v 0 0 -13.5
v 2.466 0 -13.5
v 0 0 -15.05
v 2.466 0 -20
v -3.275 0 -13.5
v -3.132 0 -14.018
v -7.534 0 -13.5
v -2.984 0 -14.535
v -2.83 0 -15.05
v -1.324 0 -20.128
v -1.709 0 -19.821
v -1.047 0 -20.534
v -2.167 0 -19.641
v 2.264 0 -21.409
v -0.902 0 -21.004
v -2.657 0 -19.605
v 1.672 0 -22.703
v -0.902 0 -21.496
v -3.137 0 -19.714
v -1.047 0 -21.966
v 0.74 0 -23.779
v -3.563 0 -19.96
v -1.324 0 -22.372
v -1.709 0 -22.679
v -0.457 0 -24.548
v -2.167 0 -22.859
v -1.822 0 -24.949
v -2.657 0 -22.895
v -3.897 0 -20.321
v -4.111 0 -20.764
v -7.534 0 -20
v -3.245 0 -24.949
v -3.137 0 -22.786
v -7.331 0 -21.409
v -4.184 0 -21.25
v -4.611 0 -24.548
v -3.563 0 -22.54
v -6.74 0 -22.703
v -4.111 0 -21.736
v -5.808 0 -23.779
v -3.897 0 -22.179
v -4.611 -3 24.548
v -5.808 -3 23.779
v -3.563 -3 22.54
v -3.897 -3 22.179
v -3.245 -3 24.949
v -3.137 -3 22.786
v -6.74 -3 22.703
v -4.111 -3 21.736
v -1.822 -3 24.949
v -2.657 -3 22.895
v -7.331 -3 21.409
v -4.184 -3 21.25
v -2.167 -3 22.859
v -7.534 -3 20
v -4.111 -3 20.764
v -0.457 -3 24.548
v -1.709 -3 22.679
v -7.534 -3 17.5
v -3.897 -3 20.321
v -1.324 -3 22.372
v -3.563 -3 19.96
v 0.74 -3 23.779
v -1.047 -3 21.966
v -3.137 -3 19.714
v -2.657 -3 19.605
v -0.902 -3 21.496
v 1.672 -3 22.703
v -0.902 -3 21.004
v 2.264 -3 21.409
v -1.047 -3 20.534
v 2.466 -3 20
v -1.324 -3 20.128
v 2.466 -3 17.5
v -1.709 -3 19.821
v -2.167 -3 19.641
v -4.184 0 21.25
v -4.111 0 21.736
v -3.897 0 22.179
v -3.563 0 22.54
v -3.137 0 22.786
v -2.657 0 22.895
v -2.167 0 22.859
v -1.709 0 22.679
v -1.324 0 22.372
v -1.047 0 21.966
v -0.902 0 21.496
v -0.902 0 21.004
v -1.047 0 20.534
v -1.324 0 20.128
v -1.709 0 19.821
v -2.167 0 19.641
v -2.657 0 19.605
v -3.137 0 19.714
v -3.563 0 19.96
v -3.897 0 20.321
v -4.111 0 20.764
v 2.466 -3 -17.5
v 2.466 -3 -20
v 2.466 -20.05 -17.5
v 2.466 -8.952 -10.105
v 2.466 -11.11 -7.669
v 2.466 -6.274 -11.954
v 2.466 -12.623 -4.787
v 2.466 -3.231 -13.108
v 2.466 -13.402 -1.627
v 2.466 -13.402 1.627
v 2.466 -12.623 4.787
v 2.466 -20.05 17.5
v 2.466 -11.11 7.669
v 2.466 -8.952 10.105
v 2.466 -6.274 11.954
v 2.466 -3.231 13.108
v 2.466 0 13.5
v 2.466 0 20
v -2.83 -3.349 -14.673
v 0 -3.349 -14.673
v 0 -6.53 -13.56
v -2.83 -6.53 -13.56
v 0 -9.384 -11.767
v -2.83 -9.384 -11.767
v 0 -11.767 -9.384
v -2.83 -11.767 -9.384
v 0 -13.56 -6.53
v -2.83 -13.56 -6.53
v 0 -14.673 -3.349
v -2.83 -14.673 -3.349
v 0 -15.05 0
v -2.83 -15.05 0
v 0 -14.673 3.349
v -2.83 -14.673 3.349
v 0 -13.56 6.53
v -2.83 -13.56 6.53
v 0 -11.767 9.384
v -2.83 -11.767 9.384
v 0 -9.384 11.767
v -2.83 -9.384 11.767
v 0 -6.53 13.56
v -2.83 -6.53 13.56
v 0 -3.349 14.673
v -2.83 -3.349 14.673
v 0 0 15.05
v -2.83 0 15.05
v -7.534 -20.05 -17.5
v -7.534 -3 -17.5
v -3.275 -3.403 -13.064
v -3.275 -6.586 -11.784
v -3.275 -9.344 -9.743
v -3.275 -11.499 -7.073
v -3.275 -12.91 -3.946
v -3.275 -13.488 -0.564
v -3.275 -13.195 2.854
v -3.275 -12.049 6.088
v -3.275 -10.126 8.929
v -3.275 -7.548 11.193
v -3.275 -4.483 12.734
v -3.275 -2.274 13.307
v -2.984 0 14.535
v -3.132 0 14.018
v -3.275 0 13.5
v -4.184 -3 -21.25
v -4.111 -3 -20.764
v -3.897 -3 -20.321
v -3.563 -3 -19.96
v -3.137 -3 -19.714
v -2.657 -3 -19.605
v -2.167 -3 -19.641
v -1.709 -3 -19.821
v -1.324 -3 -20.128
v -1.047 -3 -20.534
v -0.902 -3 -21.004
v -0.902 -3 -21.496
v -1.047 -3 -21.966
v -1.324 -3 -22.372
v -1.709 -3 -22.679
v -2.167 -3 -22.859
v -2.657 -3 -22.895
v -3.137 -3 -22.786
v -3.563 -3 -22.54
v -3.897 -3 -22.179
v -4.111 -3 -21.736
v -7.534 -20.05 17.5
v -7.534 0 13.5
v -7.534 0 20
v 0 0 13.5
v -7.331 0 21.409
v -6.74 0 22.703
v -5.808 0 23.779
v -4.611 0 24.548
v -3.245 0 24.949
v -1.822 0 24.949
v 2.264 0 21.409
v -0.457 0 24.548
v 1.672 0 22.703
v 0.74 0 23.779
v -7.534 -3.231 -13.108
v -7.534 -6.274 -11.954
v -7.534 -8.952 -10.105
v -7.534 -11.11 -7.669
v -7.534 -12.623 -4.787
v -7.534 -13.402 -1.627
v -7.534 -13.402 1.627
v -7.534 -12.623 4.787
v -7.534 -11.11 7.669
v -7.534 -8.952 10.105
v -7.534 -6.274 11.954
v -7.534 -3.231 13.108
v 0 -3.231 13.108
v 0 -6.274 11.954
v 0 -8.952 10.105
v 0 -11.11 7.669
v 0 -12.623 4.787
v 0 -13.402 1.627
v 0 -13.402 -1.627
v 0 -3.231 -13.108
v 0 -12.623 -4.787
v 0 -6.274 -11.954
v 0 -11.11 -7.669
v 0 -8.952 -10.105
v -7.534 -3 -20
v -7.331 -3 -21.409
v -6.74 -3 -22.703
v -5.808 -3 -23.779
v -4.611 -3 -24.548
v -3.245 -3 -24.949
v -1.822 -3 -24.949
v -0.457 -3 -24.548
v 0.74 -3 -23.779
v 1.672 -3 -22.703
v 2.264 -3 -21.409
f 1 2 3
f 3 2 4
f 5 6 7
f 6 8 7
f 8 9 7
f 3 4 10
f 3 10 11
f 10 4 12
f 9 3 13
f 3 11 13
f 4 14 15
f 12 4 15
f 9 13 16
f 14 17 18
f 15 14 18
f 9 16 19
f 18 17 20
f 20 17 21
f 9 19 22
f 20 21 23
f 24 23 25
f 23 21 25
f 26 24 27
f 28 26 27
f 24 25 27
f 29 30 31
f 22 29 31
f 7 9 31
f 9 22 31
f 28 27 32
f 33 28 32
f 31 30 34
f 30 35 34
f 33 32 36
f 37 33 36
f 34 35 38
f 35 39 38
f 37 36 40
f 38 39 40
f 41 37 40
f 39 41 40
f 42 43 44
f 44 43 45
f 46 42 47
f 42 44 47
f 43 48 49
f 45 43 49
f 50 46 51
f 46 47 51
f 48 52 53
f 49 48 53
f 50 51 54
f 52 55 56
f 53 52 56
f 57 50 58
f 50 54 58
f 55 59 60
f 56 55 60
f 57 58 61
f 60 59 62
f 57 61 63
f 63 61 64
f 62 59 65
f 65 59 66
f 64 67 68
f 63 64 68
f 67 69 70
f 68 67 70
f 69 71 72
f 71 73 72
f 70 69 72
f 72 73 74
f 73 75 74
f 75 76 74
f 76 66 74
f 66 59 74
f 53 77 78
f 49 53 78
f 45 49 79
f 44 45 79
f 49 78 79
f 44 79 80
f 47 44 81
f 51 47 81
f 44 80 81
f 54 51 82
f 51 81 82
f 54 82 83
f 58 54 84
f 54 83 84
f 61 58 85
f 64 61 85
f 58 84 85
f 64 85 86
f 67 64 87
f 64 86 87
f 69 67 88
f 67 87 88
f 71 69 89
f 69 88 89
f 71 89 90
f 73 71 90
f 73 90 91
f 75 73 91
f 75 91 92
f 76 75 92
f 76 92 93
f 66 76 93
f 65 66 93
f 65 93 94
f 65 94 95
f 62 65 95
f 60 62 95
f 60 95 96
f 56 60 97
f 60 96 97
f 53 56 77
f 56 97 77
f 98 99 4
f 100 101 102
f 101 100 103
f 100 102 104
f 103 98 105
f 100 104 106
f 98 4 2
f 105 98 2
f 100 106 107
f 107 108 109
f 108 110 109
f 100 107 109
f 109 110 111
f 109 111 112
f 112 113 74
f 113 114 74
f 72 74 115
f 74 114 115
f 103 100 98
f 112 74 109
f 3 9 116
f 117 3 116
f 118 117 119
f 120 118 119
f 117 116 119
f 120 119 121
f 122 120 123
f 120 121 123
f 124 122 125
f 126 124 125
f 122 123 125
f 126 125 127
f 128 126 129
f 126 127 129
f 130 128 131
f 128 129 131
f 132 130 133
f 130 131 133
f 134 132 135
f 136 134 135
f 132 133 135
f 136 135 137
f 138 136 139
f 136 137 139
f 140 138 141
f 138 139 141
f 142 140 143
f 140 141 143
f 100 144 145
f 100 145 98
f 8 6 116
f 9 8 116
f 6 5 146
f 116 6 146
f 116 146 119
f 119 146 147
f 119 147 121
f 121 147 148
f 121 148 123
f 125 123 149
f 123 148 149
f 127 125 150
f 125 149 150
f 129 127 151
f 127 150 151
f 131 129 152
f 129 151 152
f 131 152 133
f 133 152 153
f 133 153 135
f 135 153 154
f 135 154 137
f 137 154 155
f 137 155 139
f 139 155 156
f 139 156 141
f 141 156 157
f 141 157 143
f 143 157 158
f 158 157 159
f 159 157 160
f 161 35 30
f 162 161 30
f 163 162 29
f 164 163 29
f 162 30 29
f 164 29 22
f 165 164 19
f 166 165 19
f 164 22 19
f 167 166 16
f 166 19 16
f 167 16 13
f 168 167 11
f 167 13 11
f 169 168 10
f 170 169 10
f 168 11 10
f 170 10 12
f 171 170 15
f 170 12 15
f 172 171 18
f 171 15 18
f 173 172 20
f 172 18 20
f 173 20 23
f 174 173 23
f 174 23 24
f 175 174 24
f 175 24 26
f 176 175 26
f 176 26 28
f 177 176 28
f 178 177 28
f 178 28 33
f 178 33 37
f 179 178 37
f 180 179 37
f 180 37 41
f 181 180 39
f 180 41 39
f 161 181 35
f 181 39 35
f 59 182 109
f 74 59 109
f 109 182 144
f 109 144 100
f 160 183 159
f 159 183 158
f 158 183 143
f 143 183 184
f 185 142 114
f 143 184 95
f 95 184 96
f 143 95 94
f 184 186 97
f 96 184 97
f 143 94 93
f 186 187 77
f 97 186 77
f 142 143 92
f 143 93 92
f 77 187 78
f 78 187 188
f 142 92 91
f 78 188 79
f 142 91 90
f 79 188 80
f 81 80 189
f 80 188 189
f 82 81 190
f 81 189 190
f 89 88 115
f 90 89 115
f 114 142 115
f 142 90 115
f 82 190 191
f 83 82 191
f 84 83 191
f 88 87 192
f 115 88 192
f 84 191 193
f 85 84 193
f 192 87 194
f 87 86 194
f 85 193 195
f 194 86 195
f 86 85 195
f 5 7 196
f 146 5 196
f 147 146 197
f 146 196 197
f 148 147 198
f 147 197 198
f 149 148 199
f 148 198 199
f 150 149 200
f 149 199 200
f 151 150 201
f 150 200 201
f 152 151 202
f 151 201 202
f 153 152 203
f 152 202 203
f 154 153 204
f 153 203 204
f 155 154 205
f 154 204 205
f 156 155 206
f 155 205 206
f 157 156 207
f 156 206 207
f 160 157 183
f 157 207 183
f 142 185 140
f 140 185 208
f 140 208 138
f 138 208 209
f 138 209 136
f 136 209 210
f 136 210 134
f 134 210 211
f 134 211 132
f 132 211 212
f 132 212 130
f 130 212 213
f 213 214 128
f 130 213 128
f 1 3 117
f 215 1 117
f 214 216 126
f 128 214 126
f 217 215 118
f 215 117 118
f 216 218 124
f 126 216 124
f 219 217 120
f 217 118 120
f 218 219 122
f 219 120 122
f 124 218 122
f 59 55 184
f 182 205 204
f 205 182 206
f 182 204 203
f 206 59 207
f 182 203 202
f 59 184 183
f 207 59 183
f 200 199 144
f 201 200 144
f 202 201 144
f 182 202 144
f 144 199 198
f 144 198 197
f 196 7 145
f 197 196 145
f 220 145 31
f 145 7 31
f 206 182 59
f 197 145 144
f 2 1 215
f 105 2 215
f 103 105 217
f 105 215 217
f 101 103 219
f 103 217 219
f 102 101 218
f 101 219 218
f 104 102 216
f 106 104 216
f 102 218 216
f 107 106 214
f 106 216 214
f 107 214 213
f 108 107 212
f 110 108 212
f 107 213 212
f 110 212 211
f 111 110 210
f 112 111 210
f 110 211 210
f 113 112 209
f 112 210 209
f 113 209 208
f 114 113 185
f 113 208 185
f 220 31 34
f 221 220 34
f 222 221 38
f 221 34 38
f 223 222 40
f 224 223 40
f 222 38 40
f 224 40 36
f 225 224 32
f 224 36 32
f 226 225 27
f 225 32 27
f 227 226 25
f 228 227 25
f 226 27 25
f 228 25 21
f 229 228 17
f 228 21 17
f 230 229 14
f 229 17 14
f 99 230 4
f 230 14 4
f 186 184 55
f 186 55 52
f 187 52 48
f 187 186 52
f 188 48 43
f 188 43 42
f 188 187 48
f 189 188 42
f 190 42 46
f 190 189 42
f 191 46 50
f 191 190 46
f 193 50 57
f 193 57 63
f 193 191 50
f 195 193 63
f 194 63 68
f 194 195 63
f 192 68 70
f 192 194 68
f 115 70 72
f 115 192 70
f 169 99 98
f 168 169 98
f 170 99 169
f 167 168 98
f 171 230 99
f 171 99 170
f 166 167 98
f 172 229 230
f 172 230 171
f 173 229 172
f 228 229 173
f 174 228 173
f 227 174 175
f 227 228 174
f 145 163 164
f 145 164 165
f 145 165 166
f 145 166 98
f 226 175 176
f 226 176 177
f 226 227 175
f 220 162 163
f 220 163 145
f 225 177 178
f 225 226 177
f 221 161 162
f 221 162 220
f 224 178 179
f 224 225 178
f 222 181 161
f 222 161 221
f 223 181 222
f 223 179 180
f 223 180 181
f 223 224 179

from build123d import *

# Parameters (mm, degrees)
SKETCH1_W           = 10
SKETCH1_H           = 20.05
BOSS_EXTRUDE4_DEPTH = 17.5
SKETCH11_R          = 13.5
CUT_EXTRUDE5_DEPTH  = 29.42978192
SKETCH13_R          = 1.65
BOSS_EXTRUDE7_DEPTH = 3


with BuildPart() as part:
    # Sketch1 → Boss-Extrude4 (new, symmetric)
    with BuildSketch(Plane.XY):
        with Locations((-2.533836661, -10.025)):
            Rectangle(SKETCH1_W, SKETCH1_H)
    extrude(amount=BOSS_EXTRUDE4_DEPTH, both=True)

    # Sketch1<5> → Cut-Revolve4 (revolve, cut)
    with BuildSketch(Plane.XY):
        with BuildLine():
            Line((0, 15.05), (-2.83, 15.05))
            ThreePointArc((-2.83, 15.05), (-4.505197002, 7.607721109), (-5.067673322, 0))
            Line((-5.067673322, 0), (0, 0))
            Line((0, 0), (0, 15.05))
        make_face()
    revolve(axis=Axis((0, 0, 0), (-1, 0, 0)), mode=Mode.SUBTRACT)

    # Sketch11 → Cut-Extrude5 (cut, through all)
    with BuildSketch(Plane.ZY.offset(7.533836661)):
        Circle(SKETCH11_R)
    extrude(amount=-CUT_EXTRUDE5_DEPTH, mode=Mode.SUBTRACT)

    # Sketch13 → Boss-Extrude7 (add)
    # profile 1 of 2: a face of its own
    with BuildSketch(Plane(origin=(0, 0, 0), x_dir=(1, 0, 0), z_dir=(0, 1, 0))):
        with BuildLine():
            Line((2.466163339, 17.5), (-7.533836661, 17.5))
            Line((-7.533836661, 17.5), (-7.533836661, 20))
            ThreePointArc((-7.533836661, 20), (-2.533836661, 25), (2.466163339, 20))
            Line((2.466163339, 20), (2.466163339, 17.5))
        make_face()
        with Locations((-2.533836661, 21.25)):
            Circle(SKETCH13_R, mode=Mode.SUBTRACT)
    # profile 2 of 2: a face of its own
    with BuildSketch(Plane(origin=(0, 0, 0), x_dir=(1, 0, 0), z_dir=(0, 1, 0))):
        with BuildLine():
            Line((2.466163339, -17.5), (-7.533836661, -17.5))
            Line((-7.533836661, -17.5), (-7.533836661, -20))
            ThreePointArc((-7.533836661, -20), (-2.533836661, -25), (2.466163339, -20))
            Line((2.466163339, -20), (2.466163339, -17.5))
        make_face()
        with Locations((-2.533836661, -21.25)):
            Circle(SKETCH13_R, mode=Mode.SUBTRACT)
    extrude(amount=-BOSS_EXTRUDE7_DEPTH)


solid = part.part
